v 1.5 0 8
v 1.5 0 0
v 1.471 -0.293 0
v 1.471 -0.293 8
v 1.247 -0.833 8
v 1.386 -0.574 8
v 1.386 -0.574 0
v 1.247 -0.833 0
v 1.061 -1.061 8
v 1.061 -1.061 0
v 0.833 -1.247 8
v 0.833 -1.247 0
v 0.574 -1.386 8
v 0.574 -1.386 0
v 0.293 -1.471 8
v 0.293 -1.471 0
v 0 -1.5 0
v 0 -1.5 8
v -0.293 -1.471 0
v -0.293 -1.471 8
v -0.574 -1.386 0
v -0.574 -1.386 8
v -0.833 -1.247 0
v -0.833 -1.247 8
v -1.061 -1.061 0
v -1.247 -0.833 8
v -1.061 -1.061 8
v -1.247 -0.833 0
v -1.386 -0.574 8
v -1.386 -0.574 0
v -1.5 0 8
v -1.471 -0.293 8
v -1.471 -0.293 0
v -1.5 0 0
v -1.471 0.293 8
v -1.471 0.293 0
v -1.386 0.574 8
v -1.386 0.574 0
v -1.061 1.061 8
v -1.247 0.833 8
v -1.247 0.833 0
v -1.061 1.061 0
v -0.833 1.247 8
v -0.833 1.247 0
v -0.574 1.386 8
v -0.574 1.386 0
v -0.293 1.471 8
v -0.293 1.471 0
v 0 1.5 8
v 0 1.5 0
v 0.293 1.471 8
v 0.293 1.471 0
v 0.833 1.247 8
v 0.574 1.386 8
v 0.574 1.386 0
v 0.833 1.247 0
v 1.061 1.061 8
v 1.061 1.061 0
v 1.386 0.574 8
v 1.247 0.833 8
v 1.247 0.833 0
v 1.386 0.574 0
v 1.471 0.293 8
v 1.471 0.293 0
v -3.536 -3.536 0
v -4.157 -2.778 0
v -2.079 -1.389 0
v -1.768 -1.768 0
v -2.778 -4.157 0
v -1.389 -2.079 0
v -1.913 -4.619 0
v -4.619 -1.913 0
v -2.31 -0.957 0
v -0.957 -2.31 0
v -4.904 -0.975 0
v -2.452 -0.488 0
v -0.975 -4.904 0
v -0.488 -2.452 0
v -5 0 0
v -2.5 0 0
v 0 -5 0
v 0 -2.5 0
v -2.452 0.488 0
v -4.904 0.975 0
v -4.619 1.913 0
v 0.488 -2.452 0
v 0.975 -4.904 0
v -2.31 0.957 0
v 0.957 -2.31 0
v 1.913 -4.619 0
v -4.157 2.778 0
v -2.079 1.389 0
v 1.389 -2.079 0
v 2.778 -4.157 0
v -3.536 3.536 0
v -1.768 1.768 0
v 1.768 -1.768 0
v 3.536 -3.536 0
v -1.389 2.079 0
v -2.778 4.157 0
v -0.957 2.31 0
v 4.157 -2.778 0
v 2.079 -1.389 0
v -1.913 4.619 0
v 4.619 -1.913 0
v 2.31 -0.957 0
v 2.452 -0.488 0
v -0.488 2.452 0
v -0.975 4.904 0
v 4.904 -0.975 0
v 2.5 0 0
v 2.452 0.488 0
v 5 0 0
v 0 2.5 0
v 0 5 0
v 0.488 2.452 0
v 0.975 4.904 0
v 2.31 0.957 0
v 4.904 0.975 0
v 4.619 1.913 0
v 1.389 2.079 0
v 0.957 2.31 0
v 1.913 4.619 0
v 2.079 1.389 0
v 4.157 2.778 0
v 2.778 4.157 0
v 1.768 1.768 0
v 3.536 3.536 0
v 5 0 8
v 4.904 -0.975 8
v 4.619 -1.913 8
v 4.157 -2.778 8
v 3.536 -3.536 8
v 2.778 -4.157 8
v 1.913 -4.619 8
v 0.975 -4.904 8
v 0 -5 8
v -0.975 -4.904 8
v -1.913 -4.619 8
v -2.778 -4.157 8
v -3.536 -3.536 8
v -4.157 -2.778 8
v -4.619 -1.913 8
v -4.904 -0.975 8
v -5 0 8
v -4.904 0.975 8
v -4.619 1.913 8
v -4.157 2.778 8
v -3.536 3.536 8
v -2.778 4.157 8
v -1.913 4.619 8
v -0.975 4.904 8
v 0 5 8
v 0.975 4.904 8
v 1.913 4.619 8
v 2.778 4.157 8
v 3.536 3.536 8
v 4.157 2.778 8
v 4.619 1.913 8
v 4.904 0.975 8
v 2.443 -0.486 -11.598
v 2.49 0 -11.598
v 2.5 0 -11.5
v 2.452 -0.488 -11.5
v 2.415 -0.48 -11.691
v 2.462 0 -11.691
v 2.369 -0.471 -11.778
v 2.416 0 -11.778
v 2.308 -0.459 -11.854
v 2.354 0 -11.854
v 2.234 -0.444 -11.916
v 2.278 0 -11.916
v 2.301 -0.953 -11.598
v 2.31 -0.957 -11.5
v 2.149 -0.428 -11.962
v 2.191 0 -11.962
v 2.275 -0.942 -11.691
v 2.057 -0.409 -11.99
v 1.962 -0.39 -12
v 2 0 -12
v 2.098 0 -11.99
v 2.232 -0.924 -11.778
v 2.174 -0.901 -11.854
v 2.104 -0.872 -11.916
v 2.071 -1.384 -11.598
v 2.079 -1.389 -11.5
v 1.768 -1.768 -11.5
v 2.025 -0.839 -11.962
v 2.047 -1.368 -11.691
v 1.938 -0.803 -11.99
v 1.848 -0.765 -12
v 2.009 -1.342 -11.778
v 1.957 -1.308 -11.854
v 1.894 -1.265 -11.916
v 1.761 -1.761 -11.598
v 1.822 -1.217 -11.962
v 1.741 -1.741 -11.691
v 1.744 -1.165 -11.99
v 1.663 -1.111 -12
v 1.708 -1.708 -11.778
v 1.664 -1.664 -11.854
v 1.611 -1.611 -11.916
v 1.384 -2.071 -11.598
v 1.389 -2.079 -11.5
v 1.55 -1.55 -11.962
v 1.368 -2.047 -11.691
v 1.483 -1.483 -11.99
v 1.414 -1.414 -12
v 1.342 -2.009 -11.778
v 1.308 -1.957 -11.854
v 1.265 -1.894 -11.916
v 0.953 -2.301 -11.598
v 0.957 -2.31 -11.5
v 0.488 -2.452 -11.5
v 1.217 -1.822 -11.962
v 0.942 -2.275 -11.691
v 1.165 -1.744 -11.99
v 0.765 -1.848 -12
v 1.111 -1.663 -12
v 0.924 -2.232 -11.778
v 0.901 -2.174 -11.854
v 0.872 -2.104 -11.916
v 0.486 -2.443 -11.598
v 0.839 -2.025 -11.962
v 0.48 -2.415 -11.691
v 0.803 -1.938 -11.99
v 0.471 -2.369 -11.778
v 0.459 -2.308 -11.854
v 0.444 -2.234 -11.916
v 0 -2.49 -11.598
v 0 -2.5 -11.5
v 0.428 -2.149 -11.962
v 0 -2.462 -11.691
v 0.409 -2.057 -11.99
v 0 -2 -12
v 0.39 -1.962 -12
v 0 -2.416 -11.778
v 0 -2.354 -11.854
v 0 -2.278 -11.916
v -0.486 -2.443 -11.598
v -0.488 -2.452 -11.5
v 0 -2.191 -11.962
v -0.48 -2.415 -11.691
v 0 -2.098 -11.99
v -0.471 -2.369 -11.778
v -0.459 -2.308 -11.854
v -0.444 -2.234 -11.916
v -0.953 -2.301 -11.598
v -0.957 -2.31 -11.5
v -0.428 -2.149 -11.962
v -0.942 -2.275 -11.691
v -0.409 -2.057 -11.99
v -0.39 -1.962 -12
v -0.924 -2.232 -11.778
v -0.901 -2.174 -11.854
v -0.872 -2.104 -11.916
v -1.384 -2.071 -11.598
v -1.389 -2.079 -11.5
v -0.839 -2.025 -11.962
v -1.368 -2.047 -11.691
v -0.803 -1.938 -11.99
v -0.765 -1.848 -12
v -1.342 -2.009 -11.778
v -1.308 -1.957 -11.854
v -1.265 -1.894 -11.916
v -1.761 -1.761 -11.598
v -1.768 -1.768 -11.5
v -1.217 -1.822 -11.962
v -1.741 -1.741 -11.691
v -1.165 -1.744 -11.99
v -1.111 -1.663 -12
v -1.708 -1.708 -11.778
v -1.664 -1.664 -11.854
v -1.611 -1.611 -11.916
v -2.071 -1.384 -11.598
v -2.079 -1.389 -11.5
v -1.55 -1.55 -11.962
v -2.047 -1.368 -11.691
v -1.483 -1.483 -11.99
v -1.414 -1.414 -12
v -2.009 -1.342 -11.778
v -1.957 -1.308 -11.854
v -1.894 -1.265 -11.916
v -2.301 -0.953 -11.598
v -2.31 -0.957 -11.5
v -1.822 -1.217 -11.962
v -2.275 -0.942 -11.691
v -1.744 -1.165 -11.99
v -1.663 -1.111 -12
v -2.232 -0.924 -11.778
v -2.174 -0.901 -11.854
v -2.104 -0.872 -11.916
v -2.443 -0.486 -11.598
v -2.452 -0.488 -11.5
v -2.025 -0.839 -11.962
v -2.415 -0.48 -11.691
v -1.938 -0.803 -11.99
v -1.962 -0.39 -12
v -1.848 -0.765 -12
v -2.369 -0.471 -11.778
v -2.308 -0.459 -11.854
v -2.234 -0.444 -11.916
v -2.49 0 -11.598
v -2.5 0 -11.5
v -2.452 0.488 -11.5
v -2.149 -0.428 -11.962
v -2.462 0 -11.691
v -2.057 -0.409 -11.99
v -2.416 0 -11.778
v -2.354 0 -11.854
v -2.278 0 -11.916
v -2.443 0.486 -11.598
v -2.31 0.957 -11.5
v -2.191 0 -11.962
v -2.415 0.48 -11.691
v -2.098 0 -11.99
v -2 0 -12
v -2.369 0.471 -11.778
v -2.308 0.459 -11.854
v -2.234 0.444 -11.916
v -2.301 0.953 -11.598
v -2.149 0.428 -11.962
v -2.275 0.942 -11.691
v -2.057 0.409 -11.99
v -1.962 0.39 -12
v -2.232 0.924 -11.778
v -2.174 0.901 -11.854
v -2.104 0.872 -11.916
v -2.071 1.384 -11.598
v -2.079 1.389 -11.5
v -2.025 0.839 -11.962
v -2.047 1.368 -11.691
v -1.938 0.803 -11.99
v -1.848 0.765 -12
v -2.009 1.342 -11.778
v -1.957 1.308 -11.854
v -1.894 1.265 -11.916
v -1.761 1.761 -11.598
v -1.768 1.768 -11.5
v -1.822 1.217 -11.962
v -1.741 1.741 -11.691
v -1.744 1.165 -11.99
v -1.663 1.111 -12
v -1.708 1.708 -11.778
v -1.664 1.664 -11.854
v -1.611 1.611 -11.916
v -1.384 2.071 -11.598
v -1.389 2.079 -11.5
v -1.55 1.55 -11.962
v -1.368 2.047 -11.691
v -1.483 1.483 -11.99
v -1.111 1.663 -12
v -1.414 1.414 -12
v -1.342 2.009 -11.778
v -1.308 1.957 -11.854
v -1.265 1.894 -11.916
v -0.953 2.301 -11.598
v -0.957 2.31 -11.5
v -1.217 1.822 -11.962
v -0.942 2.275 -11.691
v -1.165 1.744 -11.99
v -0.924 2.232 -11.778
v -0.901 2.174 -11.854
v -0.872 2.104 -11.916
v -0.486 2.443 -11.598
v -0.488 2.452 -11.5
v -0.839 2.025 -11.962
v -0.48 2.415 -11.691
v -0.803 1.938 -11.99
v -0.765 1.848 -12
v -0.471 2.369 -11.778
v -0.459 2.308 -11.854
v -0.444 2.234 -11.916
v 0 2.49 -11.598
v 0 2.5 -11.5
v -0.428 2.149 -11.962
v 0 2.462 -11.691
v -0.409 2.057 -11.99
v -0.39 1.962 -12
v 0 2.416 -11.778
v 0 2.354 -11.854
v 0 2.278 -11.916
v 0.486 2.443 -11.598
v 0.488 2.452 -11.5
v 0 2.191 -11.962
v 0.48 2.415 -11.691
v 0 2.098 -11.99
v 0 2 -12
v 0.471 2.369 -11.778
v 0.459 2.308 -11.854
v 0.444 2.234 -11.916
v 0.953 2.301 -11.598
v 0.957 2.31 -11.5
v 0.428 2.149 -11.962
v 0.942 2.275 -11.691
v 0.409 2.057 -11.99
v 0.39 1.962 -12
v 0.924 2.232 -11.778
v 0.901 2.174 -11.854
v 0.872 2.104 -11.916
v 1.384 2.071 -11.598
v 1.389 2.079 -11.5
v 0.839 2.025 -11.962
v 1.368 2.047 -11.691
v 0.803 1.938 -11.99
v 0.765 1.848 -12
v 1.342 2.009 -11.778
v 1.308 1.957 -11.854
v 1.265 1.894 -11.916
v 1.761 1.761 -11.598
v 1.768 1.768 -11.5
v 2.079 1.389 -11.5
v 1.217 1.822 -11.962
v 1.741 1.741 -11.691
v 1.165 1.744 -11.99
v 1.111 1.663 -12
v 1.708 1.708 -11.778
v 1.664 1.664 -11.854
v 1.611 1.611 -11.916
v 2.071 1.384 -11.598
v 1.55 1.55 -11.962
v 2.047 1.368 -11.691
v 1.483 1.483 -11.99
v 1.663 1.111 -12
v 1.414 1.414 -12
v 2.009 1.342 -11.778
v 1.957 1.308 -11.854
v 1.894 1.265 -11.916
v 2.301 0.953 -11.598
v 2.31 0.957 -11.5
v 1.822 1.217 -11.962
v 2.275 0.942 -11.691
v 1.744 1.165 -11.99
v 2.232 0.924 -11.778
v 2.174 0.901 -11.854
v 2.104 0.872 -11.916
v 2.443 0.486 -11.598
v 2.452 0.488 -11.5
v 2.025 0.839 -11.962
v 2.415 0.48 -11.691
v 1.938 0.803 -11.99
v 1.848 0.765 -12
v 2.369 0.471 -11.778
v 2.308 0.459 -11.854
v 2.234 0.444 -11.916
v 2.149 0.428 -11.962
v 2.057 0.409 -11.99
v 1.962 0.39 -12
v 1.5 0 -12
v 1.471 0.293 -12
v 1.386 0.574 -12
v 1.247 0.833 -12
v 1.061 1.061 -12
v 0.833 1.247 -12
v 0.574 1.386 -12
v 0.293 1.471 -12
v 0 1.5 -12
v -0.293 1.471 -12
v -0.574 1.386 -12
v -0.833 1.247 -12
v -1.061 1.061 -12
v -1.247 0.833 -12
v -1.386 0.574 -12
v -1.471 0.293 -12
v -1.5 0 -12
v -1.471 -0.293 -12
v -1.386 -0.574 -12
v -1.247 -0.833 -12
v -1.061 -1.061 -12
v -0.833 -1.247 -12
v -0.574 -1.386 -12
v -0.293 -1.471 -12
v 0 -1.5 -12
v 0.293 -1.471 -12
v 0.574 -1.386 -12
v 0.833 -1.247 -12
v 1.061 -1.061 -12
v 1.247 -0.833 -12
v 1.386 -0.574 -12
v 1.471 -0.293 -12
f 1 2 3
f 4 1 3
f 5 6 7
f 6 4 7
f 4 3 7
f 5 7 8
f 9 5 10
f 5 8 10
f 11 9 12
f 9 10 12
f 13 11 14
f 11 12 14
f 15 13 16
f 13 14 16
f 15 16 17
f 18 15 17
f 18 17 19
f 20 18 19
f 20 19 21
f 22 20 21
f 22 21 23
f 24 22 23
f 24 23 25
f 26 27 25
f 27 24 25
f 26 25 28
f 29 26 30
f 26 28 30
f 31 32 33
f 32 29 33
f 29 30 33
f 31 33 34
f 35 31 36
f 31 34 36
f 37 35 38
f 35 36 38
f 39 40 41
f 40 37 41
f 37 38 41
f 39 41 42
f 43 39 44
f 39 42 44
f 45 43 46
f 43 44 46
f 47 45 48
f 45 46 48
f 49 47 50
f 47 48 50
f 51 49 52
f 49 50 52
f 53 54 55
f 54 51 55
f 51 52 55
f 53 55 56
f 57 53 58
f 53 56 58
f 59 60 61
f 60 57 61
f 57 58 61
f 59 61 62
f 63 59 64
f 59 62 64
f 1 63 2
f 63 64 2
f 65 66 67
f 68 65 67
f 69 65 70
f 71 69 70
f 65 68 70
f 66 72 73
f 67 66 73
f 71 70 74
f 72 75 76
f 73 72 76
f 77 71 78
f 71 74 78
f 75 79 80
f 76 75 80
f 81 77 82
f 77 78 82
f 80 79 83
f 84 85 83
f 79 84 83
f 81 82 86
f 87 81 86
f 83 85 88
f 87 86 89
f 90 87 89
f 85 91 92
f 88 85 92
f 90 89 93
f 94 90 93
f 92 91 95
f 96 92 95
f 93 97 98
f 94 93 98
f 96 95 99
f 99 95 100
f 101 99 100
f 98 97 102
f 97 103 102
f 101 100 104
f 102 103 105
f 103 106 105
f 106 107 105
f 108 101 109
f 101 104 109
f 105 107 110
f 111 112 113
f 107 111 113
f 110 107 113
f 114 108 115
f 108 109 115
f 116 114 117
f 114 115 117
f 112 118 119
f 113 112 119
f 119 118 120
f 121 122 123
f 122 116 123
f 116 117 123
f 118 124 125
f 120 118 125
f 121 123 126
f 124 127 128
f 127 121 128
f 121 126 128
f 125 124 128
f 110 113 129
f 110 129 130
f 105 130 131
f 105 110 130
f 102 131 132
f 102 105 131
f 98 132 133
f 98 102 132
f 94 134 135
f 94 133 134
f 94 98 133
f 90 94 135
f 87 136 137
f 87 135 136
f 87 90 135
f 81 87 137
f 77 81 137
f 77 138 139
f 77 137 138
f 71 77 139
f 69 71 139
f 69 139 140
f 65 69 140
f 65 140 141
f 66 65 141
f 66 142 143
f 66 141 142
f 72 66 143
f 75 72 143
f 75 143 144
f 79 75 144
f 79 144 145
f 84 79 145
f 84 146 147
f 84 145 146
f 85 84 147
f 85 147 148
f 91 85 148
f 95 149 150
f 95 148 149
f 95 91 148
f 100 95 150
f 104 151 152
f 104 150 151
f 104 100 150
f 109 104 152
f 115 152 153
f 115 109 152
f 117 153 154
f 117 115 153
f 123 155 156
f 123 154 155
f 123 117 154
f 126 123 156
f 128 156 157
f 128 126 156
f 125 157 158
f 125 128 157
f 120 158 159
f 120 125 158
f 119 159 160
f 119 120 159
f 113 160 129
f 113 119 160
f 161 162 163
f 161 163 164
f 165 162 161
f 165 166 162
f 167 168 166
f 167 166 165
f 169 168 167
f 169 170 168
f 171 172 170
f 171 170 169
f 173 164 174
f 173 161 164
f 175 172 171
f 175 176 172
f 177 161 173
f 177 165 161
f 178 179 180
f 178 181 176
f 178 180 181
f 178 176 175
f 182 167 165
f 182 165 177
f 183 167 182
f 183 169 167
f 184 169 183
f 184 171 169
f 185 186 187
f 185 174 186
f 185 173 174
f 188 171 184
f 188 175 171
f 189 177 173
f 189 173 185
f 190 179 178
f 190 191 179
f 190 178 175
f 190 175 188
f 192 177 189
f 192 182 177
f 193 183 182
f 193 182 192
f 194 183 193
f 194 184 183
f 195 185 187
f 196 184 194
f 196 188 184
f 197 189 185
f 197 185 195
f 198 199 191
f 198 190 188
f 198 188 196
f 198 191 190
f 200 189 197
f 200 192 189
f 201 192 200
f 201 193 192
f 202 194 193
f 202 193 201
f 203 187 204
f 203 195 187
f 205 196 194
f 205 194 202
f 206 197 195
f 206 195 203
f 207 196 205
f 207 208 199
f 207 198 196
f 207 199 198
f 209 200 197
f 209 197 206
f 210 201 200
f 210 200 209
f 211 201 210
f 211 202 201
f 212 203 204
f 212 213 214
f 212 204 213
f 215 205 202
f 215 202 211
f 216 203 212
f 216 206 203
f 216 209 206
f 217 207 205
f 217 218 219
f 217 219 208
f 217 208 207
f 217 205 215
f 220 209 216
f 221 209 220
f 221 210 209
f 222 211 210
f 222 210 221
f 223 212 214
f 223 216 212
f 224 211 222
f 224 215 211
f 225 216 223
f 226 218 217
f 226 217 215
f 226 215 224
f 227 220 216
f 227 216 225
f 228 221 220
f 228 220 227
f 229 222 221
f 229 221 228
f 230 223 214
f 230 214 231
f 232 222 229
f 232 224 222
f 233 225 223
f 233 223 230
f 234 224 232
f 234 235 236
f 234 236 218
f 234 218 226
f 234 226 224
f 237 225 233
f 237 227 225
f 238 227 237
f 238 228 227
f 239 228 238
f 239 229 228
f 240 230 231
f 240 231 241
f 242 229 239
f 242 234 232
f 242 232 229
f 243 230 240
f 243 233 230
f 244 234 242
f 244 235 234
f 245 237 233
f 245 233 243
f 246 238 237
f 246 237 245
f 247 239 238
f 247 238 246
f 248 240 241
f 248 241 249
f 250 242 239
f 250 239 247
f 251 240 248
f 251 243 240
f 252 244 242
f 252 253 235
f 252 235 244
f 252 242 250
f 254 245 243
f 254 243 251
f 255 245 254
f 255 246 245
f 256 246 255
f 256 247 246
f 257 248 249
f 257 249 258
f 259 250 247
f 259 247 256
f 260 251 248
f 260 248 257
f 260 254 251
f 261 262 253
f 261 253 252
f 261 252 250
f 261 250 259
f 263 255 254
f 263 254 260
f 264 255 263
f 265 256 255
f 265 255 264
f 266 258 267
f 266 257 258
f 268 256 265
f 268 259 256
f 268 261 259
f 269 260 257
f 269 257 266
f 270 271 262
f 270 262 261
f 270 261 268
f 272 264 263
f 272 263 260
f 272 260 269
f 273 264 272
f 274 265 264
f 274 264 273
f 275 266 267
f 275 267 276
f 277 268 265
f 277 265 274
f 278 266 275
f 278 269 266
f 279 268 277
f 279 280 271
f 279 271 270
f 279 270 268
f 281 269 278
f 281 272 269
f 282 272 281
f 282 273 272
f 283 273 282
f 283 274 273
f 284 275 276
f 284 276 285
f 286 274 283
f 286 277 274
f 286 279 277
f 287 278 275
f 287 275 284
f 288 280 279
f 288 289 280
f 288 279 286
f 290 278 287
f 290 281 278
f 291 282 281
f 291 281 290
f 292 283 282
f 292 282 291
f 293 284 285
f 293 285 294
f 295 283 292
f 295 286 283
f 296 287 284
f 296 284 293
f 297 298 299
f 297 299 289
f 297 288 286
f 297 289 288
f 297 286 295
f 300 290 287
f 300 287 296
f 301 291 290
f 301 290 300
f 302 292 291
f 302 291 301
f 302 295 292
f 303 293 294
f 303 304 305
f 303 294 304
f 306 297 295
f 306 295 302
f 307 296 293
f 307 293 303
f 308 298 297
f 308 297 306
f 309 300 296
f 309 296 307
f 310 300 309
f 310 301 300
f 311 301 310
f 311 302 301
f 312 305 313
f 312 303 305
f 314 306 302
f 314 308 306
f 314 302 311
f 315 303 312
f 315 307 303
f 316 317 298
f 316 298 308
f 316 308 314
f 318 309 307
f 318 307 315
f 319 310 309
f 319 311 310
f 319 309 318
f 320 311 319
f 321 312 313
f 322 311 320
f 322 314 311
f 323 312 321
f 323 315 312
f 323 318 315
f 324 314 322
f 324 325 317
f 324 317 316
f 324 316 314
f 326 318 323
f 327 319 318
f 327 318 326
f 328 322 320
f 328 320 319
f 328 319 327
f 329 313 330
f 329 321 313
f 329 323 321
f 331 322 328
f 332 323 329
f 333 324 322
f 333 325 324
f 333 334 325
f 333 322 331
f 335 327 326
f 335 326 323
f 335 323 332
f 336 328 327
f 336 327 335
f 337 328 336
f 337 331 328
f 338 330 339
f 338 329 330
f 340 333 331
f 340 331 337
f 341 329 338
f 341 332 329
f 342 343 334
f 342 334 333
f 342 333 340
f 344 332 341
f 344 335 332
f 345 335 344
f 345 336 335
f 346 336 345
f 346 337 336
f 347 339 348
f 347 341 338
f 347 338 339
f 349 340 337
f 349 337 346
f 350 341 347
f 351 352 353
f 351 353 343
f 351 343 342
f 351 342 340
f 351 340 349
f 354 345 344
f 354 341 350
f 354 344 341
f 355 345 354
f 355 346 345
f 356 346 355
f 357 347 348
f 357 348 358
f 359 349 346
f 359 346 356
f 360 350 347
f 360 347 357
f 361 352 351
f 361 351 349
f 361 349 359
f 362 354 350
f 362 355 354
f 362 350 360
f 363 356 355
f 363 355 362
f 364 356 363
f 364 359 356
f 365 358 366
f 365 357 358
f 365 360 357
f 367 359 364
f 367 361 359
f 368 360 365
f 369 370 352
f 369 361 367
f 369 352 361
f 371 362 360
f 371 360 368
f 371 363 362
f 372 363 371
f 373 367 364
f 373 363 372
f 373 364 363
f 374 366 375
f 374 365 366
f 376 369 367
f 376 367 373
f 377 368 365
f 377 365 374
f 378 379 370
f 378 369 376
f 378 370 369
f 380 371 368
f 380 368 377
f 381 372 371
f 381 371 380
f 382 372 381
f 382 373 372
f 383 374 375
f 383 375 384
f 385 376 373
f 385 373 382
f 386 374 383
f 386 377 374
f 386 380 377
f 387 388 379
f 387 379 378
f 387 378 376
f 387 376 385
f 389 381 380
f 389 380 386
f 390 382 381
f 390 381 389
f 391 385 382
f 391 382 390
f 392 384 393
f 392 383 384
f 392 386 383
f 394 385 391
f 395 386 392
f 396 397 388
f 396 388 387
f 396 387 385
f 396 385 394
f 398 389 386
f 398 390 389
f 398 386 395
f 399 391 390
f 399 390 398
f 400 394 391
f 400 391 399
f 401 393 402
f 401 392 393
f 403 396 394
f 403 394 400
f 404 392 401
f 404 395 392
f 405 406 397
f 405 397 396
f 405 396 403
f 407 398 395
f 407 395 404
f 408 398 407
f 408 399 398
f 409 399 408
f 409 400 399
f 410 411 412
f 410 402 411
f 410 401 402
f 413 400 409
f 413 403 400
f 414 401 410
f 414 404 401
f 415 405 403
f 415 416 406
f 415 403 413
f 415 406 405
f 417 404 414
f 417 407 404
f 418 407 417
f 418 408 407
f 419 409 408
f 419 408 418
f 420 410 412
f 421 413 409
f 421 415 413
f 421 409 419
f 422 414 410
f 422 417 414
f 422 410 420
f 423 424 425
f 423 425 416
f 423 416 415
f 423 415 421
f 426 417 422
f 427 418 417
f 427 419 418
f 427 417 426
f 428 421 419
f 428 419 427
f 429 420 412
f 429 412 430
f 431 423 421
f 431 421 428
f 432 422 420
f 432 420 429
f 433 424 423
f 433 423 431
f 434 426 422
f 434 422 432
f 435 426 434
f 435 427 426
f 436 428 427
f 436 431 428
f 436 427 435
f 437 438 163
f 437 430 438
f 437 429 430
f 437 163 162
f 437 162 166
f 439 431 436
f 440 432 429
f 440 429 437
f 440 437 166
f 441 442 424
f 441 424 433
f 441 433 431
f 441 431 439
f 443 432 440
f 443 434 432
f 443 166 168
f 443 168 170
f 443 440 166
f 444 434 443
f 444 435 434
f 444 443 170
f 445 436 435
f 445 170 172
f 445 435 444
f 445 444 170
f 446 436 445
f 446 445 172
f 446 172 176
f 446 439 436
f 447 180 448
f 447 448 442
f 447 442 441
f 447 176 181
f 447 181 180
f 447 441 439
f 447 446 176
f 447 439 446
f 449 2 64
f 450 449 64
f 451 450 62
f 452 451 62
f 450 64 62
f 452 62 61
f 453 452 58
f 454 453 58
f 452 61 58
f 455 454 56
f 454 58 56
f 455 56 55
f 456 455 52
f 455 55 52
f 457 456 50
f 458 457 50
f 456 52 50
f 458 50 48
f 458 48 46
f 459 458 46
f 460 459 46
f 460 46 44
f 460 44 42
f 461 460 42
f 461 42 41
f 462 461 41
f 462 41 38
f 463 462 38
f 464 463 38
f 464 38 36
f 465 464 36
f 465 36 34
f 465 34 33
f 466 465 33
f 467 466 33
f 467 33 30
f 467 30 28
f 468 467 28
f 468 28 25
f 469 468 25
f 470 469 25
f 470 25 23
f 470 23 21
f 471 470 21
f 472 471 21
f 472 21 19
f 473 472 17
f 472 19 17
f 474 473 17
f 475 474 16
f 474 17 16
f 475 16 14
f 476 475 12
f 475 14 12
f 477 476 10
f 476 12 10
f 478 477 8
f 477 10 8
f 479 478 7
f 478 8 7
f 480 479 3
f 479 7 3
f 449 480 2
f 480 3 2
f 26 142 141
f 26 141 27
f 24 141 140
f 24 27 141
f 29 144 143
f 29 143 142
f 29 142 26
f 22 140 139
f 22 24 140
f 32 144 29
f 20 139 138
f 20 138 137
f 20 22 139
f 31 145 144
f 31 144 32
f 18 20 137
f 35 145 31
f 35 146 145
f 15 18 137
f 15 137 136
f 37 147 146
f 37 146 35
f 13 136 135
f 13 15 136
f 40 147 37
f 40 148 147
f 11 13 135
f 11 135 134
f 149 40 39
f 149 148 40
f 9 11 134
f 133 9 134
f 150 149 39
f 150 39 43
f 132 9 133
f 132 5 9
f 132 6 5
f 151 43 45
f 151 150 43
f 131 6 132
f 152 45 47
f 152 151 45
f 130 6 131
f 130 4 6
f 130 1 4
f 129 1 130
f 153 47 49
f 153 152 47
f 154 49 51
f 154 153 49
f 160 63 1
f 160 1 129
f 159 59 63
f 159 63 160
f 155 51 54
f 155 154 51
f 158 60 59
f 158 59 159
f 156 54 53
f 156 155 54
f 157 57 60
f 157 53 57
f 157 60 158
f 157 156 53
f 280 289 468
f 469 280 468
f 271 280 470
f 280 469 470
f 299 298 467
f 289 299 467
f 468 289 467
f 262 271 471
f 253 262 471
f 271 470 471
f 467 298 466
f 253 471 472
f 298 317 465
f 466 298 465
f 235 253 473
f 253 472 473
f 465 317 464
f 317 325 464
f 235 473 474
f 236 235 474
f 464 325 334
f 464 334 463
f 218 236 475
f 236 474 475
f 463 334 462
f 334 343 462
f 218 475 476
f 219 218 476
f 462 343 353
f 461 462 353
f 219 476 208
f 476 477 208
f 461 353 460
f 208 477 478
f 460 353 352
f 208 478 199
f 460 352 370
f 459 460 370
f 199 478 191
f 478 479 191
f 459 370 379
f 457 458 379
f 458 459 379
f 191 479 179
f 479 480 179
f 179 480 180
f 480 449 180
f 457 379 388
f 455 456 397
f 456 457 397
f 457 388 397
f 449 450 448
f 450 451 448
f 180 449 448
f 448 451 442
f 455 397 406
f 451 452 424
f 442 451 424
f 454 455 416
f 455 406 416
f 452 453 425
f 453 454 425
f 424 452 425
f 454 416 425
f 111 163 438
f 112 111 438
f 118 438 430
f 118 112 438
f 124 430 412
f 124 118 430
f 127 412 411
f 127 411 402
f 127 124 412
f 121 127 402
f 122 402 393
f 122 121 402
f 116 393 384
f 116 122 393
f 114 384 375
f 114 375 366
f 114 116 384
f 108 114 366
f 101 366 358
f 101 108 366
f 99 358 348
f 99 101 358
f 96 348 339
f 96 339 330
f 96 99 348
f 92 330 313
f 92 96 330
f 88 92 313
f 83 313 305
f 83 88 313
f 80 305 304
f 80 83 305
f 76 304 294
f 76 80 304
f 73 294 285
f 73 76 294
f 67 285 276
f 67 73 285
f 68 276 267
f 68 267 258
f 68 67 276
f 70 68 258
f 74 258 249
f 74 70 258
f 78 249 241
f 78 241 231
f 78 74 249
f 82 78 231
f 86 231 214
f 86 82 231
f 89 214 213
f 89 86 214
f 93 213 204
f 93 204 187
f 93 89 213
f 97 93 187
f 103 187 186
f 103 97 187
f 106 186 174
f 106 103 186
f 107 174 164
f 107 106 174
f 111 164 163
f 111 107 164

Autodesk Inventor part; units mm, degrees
ref_plane "YZ Plane" through (0, 0, 0) normal (1, 0, 0) x (0, 1, 0)
ref_plane "XZ Plane" through (0, 0, 0) normal (0, 1, 0) x (-1, 0, 0)
ref_plane "XY Plane" through (0, 0, 0) normal (0, 0, 1) x (1, 0, 0)
sketch "Sketch1" plane through (0, 0, 0) normal (0, 0, 1) x (1, 0, 0)
  circle A0 centre (0, 0) radius 5
  circle A1 centre (0, 0) radius 2.5
  circle A2 centre (0, 0) radius 1.5
  dimension "d0" = 10
  dimension "d1" = 5
  dimension "d7" = 3
extrude "Extrusion1" add sketch "Sketch1" along normal blind 8 contours A0 | A1
extrude "Extrusion2" add sketch "Sketch1" against normal blind 12 contours A1
fillet "Fillet1" radius 0.5 1 edges at (-2.5, 0, -12)
properties part number "Tubing_Male_Connector"
